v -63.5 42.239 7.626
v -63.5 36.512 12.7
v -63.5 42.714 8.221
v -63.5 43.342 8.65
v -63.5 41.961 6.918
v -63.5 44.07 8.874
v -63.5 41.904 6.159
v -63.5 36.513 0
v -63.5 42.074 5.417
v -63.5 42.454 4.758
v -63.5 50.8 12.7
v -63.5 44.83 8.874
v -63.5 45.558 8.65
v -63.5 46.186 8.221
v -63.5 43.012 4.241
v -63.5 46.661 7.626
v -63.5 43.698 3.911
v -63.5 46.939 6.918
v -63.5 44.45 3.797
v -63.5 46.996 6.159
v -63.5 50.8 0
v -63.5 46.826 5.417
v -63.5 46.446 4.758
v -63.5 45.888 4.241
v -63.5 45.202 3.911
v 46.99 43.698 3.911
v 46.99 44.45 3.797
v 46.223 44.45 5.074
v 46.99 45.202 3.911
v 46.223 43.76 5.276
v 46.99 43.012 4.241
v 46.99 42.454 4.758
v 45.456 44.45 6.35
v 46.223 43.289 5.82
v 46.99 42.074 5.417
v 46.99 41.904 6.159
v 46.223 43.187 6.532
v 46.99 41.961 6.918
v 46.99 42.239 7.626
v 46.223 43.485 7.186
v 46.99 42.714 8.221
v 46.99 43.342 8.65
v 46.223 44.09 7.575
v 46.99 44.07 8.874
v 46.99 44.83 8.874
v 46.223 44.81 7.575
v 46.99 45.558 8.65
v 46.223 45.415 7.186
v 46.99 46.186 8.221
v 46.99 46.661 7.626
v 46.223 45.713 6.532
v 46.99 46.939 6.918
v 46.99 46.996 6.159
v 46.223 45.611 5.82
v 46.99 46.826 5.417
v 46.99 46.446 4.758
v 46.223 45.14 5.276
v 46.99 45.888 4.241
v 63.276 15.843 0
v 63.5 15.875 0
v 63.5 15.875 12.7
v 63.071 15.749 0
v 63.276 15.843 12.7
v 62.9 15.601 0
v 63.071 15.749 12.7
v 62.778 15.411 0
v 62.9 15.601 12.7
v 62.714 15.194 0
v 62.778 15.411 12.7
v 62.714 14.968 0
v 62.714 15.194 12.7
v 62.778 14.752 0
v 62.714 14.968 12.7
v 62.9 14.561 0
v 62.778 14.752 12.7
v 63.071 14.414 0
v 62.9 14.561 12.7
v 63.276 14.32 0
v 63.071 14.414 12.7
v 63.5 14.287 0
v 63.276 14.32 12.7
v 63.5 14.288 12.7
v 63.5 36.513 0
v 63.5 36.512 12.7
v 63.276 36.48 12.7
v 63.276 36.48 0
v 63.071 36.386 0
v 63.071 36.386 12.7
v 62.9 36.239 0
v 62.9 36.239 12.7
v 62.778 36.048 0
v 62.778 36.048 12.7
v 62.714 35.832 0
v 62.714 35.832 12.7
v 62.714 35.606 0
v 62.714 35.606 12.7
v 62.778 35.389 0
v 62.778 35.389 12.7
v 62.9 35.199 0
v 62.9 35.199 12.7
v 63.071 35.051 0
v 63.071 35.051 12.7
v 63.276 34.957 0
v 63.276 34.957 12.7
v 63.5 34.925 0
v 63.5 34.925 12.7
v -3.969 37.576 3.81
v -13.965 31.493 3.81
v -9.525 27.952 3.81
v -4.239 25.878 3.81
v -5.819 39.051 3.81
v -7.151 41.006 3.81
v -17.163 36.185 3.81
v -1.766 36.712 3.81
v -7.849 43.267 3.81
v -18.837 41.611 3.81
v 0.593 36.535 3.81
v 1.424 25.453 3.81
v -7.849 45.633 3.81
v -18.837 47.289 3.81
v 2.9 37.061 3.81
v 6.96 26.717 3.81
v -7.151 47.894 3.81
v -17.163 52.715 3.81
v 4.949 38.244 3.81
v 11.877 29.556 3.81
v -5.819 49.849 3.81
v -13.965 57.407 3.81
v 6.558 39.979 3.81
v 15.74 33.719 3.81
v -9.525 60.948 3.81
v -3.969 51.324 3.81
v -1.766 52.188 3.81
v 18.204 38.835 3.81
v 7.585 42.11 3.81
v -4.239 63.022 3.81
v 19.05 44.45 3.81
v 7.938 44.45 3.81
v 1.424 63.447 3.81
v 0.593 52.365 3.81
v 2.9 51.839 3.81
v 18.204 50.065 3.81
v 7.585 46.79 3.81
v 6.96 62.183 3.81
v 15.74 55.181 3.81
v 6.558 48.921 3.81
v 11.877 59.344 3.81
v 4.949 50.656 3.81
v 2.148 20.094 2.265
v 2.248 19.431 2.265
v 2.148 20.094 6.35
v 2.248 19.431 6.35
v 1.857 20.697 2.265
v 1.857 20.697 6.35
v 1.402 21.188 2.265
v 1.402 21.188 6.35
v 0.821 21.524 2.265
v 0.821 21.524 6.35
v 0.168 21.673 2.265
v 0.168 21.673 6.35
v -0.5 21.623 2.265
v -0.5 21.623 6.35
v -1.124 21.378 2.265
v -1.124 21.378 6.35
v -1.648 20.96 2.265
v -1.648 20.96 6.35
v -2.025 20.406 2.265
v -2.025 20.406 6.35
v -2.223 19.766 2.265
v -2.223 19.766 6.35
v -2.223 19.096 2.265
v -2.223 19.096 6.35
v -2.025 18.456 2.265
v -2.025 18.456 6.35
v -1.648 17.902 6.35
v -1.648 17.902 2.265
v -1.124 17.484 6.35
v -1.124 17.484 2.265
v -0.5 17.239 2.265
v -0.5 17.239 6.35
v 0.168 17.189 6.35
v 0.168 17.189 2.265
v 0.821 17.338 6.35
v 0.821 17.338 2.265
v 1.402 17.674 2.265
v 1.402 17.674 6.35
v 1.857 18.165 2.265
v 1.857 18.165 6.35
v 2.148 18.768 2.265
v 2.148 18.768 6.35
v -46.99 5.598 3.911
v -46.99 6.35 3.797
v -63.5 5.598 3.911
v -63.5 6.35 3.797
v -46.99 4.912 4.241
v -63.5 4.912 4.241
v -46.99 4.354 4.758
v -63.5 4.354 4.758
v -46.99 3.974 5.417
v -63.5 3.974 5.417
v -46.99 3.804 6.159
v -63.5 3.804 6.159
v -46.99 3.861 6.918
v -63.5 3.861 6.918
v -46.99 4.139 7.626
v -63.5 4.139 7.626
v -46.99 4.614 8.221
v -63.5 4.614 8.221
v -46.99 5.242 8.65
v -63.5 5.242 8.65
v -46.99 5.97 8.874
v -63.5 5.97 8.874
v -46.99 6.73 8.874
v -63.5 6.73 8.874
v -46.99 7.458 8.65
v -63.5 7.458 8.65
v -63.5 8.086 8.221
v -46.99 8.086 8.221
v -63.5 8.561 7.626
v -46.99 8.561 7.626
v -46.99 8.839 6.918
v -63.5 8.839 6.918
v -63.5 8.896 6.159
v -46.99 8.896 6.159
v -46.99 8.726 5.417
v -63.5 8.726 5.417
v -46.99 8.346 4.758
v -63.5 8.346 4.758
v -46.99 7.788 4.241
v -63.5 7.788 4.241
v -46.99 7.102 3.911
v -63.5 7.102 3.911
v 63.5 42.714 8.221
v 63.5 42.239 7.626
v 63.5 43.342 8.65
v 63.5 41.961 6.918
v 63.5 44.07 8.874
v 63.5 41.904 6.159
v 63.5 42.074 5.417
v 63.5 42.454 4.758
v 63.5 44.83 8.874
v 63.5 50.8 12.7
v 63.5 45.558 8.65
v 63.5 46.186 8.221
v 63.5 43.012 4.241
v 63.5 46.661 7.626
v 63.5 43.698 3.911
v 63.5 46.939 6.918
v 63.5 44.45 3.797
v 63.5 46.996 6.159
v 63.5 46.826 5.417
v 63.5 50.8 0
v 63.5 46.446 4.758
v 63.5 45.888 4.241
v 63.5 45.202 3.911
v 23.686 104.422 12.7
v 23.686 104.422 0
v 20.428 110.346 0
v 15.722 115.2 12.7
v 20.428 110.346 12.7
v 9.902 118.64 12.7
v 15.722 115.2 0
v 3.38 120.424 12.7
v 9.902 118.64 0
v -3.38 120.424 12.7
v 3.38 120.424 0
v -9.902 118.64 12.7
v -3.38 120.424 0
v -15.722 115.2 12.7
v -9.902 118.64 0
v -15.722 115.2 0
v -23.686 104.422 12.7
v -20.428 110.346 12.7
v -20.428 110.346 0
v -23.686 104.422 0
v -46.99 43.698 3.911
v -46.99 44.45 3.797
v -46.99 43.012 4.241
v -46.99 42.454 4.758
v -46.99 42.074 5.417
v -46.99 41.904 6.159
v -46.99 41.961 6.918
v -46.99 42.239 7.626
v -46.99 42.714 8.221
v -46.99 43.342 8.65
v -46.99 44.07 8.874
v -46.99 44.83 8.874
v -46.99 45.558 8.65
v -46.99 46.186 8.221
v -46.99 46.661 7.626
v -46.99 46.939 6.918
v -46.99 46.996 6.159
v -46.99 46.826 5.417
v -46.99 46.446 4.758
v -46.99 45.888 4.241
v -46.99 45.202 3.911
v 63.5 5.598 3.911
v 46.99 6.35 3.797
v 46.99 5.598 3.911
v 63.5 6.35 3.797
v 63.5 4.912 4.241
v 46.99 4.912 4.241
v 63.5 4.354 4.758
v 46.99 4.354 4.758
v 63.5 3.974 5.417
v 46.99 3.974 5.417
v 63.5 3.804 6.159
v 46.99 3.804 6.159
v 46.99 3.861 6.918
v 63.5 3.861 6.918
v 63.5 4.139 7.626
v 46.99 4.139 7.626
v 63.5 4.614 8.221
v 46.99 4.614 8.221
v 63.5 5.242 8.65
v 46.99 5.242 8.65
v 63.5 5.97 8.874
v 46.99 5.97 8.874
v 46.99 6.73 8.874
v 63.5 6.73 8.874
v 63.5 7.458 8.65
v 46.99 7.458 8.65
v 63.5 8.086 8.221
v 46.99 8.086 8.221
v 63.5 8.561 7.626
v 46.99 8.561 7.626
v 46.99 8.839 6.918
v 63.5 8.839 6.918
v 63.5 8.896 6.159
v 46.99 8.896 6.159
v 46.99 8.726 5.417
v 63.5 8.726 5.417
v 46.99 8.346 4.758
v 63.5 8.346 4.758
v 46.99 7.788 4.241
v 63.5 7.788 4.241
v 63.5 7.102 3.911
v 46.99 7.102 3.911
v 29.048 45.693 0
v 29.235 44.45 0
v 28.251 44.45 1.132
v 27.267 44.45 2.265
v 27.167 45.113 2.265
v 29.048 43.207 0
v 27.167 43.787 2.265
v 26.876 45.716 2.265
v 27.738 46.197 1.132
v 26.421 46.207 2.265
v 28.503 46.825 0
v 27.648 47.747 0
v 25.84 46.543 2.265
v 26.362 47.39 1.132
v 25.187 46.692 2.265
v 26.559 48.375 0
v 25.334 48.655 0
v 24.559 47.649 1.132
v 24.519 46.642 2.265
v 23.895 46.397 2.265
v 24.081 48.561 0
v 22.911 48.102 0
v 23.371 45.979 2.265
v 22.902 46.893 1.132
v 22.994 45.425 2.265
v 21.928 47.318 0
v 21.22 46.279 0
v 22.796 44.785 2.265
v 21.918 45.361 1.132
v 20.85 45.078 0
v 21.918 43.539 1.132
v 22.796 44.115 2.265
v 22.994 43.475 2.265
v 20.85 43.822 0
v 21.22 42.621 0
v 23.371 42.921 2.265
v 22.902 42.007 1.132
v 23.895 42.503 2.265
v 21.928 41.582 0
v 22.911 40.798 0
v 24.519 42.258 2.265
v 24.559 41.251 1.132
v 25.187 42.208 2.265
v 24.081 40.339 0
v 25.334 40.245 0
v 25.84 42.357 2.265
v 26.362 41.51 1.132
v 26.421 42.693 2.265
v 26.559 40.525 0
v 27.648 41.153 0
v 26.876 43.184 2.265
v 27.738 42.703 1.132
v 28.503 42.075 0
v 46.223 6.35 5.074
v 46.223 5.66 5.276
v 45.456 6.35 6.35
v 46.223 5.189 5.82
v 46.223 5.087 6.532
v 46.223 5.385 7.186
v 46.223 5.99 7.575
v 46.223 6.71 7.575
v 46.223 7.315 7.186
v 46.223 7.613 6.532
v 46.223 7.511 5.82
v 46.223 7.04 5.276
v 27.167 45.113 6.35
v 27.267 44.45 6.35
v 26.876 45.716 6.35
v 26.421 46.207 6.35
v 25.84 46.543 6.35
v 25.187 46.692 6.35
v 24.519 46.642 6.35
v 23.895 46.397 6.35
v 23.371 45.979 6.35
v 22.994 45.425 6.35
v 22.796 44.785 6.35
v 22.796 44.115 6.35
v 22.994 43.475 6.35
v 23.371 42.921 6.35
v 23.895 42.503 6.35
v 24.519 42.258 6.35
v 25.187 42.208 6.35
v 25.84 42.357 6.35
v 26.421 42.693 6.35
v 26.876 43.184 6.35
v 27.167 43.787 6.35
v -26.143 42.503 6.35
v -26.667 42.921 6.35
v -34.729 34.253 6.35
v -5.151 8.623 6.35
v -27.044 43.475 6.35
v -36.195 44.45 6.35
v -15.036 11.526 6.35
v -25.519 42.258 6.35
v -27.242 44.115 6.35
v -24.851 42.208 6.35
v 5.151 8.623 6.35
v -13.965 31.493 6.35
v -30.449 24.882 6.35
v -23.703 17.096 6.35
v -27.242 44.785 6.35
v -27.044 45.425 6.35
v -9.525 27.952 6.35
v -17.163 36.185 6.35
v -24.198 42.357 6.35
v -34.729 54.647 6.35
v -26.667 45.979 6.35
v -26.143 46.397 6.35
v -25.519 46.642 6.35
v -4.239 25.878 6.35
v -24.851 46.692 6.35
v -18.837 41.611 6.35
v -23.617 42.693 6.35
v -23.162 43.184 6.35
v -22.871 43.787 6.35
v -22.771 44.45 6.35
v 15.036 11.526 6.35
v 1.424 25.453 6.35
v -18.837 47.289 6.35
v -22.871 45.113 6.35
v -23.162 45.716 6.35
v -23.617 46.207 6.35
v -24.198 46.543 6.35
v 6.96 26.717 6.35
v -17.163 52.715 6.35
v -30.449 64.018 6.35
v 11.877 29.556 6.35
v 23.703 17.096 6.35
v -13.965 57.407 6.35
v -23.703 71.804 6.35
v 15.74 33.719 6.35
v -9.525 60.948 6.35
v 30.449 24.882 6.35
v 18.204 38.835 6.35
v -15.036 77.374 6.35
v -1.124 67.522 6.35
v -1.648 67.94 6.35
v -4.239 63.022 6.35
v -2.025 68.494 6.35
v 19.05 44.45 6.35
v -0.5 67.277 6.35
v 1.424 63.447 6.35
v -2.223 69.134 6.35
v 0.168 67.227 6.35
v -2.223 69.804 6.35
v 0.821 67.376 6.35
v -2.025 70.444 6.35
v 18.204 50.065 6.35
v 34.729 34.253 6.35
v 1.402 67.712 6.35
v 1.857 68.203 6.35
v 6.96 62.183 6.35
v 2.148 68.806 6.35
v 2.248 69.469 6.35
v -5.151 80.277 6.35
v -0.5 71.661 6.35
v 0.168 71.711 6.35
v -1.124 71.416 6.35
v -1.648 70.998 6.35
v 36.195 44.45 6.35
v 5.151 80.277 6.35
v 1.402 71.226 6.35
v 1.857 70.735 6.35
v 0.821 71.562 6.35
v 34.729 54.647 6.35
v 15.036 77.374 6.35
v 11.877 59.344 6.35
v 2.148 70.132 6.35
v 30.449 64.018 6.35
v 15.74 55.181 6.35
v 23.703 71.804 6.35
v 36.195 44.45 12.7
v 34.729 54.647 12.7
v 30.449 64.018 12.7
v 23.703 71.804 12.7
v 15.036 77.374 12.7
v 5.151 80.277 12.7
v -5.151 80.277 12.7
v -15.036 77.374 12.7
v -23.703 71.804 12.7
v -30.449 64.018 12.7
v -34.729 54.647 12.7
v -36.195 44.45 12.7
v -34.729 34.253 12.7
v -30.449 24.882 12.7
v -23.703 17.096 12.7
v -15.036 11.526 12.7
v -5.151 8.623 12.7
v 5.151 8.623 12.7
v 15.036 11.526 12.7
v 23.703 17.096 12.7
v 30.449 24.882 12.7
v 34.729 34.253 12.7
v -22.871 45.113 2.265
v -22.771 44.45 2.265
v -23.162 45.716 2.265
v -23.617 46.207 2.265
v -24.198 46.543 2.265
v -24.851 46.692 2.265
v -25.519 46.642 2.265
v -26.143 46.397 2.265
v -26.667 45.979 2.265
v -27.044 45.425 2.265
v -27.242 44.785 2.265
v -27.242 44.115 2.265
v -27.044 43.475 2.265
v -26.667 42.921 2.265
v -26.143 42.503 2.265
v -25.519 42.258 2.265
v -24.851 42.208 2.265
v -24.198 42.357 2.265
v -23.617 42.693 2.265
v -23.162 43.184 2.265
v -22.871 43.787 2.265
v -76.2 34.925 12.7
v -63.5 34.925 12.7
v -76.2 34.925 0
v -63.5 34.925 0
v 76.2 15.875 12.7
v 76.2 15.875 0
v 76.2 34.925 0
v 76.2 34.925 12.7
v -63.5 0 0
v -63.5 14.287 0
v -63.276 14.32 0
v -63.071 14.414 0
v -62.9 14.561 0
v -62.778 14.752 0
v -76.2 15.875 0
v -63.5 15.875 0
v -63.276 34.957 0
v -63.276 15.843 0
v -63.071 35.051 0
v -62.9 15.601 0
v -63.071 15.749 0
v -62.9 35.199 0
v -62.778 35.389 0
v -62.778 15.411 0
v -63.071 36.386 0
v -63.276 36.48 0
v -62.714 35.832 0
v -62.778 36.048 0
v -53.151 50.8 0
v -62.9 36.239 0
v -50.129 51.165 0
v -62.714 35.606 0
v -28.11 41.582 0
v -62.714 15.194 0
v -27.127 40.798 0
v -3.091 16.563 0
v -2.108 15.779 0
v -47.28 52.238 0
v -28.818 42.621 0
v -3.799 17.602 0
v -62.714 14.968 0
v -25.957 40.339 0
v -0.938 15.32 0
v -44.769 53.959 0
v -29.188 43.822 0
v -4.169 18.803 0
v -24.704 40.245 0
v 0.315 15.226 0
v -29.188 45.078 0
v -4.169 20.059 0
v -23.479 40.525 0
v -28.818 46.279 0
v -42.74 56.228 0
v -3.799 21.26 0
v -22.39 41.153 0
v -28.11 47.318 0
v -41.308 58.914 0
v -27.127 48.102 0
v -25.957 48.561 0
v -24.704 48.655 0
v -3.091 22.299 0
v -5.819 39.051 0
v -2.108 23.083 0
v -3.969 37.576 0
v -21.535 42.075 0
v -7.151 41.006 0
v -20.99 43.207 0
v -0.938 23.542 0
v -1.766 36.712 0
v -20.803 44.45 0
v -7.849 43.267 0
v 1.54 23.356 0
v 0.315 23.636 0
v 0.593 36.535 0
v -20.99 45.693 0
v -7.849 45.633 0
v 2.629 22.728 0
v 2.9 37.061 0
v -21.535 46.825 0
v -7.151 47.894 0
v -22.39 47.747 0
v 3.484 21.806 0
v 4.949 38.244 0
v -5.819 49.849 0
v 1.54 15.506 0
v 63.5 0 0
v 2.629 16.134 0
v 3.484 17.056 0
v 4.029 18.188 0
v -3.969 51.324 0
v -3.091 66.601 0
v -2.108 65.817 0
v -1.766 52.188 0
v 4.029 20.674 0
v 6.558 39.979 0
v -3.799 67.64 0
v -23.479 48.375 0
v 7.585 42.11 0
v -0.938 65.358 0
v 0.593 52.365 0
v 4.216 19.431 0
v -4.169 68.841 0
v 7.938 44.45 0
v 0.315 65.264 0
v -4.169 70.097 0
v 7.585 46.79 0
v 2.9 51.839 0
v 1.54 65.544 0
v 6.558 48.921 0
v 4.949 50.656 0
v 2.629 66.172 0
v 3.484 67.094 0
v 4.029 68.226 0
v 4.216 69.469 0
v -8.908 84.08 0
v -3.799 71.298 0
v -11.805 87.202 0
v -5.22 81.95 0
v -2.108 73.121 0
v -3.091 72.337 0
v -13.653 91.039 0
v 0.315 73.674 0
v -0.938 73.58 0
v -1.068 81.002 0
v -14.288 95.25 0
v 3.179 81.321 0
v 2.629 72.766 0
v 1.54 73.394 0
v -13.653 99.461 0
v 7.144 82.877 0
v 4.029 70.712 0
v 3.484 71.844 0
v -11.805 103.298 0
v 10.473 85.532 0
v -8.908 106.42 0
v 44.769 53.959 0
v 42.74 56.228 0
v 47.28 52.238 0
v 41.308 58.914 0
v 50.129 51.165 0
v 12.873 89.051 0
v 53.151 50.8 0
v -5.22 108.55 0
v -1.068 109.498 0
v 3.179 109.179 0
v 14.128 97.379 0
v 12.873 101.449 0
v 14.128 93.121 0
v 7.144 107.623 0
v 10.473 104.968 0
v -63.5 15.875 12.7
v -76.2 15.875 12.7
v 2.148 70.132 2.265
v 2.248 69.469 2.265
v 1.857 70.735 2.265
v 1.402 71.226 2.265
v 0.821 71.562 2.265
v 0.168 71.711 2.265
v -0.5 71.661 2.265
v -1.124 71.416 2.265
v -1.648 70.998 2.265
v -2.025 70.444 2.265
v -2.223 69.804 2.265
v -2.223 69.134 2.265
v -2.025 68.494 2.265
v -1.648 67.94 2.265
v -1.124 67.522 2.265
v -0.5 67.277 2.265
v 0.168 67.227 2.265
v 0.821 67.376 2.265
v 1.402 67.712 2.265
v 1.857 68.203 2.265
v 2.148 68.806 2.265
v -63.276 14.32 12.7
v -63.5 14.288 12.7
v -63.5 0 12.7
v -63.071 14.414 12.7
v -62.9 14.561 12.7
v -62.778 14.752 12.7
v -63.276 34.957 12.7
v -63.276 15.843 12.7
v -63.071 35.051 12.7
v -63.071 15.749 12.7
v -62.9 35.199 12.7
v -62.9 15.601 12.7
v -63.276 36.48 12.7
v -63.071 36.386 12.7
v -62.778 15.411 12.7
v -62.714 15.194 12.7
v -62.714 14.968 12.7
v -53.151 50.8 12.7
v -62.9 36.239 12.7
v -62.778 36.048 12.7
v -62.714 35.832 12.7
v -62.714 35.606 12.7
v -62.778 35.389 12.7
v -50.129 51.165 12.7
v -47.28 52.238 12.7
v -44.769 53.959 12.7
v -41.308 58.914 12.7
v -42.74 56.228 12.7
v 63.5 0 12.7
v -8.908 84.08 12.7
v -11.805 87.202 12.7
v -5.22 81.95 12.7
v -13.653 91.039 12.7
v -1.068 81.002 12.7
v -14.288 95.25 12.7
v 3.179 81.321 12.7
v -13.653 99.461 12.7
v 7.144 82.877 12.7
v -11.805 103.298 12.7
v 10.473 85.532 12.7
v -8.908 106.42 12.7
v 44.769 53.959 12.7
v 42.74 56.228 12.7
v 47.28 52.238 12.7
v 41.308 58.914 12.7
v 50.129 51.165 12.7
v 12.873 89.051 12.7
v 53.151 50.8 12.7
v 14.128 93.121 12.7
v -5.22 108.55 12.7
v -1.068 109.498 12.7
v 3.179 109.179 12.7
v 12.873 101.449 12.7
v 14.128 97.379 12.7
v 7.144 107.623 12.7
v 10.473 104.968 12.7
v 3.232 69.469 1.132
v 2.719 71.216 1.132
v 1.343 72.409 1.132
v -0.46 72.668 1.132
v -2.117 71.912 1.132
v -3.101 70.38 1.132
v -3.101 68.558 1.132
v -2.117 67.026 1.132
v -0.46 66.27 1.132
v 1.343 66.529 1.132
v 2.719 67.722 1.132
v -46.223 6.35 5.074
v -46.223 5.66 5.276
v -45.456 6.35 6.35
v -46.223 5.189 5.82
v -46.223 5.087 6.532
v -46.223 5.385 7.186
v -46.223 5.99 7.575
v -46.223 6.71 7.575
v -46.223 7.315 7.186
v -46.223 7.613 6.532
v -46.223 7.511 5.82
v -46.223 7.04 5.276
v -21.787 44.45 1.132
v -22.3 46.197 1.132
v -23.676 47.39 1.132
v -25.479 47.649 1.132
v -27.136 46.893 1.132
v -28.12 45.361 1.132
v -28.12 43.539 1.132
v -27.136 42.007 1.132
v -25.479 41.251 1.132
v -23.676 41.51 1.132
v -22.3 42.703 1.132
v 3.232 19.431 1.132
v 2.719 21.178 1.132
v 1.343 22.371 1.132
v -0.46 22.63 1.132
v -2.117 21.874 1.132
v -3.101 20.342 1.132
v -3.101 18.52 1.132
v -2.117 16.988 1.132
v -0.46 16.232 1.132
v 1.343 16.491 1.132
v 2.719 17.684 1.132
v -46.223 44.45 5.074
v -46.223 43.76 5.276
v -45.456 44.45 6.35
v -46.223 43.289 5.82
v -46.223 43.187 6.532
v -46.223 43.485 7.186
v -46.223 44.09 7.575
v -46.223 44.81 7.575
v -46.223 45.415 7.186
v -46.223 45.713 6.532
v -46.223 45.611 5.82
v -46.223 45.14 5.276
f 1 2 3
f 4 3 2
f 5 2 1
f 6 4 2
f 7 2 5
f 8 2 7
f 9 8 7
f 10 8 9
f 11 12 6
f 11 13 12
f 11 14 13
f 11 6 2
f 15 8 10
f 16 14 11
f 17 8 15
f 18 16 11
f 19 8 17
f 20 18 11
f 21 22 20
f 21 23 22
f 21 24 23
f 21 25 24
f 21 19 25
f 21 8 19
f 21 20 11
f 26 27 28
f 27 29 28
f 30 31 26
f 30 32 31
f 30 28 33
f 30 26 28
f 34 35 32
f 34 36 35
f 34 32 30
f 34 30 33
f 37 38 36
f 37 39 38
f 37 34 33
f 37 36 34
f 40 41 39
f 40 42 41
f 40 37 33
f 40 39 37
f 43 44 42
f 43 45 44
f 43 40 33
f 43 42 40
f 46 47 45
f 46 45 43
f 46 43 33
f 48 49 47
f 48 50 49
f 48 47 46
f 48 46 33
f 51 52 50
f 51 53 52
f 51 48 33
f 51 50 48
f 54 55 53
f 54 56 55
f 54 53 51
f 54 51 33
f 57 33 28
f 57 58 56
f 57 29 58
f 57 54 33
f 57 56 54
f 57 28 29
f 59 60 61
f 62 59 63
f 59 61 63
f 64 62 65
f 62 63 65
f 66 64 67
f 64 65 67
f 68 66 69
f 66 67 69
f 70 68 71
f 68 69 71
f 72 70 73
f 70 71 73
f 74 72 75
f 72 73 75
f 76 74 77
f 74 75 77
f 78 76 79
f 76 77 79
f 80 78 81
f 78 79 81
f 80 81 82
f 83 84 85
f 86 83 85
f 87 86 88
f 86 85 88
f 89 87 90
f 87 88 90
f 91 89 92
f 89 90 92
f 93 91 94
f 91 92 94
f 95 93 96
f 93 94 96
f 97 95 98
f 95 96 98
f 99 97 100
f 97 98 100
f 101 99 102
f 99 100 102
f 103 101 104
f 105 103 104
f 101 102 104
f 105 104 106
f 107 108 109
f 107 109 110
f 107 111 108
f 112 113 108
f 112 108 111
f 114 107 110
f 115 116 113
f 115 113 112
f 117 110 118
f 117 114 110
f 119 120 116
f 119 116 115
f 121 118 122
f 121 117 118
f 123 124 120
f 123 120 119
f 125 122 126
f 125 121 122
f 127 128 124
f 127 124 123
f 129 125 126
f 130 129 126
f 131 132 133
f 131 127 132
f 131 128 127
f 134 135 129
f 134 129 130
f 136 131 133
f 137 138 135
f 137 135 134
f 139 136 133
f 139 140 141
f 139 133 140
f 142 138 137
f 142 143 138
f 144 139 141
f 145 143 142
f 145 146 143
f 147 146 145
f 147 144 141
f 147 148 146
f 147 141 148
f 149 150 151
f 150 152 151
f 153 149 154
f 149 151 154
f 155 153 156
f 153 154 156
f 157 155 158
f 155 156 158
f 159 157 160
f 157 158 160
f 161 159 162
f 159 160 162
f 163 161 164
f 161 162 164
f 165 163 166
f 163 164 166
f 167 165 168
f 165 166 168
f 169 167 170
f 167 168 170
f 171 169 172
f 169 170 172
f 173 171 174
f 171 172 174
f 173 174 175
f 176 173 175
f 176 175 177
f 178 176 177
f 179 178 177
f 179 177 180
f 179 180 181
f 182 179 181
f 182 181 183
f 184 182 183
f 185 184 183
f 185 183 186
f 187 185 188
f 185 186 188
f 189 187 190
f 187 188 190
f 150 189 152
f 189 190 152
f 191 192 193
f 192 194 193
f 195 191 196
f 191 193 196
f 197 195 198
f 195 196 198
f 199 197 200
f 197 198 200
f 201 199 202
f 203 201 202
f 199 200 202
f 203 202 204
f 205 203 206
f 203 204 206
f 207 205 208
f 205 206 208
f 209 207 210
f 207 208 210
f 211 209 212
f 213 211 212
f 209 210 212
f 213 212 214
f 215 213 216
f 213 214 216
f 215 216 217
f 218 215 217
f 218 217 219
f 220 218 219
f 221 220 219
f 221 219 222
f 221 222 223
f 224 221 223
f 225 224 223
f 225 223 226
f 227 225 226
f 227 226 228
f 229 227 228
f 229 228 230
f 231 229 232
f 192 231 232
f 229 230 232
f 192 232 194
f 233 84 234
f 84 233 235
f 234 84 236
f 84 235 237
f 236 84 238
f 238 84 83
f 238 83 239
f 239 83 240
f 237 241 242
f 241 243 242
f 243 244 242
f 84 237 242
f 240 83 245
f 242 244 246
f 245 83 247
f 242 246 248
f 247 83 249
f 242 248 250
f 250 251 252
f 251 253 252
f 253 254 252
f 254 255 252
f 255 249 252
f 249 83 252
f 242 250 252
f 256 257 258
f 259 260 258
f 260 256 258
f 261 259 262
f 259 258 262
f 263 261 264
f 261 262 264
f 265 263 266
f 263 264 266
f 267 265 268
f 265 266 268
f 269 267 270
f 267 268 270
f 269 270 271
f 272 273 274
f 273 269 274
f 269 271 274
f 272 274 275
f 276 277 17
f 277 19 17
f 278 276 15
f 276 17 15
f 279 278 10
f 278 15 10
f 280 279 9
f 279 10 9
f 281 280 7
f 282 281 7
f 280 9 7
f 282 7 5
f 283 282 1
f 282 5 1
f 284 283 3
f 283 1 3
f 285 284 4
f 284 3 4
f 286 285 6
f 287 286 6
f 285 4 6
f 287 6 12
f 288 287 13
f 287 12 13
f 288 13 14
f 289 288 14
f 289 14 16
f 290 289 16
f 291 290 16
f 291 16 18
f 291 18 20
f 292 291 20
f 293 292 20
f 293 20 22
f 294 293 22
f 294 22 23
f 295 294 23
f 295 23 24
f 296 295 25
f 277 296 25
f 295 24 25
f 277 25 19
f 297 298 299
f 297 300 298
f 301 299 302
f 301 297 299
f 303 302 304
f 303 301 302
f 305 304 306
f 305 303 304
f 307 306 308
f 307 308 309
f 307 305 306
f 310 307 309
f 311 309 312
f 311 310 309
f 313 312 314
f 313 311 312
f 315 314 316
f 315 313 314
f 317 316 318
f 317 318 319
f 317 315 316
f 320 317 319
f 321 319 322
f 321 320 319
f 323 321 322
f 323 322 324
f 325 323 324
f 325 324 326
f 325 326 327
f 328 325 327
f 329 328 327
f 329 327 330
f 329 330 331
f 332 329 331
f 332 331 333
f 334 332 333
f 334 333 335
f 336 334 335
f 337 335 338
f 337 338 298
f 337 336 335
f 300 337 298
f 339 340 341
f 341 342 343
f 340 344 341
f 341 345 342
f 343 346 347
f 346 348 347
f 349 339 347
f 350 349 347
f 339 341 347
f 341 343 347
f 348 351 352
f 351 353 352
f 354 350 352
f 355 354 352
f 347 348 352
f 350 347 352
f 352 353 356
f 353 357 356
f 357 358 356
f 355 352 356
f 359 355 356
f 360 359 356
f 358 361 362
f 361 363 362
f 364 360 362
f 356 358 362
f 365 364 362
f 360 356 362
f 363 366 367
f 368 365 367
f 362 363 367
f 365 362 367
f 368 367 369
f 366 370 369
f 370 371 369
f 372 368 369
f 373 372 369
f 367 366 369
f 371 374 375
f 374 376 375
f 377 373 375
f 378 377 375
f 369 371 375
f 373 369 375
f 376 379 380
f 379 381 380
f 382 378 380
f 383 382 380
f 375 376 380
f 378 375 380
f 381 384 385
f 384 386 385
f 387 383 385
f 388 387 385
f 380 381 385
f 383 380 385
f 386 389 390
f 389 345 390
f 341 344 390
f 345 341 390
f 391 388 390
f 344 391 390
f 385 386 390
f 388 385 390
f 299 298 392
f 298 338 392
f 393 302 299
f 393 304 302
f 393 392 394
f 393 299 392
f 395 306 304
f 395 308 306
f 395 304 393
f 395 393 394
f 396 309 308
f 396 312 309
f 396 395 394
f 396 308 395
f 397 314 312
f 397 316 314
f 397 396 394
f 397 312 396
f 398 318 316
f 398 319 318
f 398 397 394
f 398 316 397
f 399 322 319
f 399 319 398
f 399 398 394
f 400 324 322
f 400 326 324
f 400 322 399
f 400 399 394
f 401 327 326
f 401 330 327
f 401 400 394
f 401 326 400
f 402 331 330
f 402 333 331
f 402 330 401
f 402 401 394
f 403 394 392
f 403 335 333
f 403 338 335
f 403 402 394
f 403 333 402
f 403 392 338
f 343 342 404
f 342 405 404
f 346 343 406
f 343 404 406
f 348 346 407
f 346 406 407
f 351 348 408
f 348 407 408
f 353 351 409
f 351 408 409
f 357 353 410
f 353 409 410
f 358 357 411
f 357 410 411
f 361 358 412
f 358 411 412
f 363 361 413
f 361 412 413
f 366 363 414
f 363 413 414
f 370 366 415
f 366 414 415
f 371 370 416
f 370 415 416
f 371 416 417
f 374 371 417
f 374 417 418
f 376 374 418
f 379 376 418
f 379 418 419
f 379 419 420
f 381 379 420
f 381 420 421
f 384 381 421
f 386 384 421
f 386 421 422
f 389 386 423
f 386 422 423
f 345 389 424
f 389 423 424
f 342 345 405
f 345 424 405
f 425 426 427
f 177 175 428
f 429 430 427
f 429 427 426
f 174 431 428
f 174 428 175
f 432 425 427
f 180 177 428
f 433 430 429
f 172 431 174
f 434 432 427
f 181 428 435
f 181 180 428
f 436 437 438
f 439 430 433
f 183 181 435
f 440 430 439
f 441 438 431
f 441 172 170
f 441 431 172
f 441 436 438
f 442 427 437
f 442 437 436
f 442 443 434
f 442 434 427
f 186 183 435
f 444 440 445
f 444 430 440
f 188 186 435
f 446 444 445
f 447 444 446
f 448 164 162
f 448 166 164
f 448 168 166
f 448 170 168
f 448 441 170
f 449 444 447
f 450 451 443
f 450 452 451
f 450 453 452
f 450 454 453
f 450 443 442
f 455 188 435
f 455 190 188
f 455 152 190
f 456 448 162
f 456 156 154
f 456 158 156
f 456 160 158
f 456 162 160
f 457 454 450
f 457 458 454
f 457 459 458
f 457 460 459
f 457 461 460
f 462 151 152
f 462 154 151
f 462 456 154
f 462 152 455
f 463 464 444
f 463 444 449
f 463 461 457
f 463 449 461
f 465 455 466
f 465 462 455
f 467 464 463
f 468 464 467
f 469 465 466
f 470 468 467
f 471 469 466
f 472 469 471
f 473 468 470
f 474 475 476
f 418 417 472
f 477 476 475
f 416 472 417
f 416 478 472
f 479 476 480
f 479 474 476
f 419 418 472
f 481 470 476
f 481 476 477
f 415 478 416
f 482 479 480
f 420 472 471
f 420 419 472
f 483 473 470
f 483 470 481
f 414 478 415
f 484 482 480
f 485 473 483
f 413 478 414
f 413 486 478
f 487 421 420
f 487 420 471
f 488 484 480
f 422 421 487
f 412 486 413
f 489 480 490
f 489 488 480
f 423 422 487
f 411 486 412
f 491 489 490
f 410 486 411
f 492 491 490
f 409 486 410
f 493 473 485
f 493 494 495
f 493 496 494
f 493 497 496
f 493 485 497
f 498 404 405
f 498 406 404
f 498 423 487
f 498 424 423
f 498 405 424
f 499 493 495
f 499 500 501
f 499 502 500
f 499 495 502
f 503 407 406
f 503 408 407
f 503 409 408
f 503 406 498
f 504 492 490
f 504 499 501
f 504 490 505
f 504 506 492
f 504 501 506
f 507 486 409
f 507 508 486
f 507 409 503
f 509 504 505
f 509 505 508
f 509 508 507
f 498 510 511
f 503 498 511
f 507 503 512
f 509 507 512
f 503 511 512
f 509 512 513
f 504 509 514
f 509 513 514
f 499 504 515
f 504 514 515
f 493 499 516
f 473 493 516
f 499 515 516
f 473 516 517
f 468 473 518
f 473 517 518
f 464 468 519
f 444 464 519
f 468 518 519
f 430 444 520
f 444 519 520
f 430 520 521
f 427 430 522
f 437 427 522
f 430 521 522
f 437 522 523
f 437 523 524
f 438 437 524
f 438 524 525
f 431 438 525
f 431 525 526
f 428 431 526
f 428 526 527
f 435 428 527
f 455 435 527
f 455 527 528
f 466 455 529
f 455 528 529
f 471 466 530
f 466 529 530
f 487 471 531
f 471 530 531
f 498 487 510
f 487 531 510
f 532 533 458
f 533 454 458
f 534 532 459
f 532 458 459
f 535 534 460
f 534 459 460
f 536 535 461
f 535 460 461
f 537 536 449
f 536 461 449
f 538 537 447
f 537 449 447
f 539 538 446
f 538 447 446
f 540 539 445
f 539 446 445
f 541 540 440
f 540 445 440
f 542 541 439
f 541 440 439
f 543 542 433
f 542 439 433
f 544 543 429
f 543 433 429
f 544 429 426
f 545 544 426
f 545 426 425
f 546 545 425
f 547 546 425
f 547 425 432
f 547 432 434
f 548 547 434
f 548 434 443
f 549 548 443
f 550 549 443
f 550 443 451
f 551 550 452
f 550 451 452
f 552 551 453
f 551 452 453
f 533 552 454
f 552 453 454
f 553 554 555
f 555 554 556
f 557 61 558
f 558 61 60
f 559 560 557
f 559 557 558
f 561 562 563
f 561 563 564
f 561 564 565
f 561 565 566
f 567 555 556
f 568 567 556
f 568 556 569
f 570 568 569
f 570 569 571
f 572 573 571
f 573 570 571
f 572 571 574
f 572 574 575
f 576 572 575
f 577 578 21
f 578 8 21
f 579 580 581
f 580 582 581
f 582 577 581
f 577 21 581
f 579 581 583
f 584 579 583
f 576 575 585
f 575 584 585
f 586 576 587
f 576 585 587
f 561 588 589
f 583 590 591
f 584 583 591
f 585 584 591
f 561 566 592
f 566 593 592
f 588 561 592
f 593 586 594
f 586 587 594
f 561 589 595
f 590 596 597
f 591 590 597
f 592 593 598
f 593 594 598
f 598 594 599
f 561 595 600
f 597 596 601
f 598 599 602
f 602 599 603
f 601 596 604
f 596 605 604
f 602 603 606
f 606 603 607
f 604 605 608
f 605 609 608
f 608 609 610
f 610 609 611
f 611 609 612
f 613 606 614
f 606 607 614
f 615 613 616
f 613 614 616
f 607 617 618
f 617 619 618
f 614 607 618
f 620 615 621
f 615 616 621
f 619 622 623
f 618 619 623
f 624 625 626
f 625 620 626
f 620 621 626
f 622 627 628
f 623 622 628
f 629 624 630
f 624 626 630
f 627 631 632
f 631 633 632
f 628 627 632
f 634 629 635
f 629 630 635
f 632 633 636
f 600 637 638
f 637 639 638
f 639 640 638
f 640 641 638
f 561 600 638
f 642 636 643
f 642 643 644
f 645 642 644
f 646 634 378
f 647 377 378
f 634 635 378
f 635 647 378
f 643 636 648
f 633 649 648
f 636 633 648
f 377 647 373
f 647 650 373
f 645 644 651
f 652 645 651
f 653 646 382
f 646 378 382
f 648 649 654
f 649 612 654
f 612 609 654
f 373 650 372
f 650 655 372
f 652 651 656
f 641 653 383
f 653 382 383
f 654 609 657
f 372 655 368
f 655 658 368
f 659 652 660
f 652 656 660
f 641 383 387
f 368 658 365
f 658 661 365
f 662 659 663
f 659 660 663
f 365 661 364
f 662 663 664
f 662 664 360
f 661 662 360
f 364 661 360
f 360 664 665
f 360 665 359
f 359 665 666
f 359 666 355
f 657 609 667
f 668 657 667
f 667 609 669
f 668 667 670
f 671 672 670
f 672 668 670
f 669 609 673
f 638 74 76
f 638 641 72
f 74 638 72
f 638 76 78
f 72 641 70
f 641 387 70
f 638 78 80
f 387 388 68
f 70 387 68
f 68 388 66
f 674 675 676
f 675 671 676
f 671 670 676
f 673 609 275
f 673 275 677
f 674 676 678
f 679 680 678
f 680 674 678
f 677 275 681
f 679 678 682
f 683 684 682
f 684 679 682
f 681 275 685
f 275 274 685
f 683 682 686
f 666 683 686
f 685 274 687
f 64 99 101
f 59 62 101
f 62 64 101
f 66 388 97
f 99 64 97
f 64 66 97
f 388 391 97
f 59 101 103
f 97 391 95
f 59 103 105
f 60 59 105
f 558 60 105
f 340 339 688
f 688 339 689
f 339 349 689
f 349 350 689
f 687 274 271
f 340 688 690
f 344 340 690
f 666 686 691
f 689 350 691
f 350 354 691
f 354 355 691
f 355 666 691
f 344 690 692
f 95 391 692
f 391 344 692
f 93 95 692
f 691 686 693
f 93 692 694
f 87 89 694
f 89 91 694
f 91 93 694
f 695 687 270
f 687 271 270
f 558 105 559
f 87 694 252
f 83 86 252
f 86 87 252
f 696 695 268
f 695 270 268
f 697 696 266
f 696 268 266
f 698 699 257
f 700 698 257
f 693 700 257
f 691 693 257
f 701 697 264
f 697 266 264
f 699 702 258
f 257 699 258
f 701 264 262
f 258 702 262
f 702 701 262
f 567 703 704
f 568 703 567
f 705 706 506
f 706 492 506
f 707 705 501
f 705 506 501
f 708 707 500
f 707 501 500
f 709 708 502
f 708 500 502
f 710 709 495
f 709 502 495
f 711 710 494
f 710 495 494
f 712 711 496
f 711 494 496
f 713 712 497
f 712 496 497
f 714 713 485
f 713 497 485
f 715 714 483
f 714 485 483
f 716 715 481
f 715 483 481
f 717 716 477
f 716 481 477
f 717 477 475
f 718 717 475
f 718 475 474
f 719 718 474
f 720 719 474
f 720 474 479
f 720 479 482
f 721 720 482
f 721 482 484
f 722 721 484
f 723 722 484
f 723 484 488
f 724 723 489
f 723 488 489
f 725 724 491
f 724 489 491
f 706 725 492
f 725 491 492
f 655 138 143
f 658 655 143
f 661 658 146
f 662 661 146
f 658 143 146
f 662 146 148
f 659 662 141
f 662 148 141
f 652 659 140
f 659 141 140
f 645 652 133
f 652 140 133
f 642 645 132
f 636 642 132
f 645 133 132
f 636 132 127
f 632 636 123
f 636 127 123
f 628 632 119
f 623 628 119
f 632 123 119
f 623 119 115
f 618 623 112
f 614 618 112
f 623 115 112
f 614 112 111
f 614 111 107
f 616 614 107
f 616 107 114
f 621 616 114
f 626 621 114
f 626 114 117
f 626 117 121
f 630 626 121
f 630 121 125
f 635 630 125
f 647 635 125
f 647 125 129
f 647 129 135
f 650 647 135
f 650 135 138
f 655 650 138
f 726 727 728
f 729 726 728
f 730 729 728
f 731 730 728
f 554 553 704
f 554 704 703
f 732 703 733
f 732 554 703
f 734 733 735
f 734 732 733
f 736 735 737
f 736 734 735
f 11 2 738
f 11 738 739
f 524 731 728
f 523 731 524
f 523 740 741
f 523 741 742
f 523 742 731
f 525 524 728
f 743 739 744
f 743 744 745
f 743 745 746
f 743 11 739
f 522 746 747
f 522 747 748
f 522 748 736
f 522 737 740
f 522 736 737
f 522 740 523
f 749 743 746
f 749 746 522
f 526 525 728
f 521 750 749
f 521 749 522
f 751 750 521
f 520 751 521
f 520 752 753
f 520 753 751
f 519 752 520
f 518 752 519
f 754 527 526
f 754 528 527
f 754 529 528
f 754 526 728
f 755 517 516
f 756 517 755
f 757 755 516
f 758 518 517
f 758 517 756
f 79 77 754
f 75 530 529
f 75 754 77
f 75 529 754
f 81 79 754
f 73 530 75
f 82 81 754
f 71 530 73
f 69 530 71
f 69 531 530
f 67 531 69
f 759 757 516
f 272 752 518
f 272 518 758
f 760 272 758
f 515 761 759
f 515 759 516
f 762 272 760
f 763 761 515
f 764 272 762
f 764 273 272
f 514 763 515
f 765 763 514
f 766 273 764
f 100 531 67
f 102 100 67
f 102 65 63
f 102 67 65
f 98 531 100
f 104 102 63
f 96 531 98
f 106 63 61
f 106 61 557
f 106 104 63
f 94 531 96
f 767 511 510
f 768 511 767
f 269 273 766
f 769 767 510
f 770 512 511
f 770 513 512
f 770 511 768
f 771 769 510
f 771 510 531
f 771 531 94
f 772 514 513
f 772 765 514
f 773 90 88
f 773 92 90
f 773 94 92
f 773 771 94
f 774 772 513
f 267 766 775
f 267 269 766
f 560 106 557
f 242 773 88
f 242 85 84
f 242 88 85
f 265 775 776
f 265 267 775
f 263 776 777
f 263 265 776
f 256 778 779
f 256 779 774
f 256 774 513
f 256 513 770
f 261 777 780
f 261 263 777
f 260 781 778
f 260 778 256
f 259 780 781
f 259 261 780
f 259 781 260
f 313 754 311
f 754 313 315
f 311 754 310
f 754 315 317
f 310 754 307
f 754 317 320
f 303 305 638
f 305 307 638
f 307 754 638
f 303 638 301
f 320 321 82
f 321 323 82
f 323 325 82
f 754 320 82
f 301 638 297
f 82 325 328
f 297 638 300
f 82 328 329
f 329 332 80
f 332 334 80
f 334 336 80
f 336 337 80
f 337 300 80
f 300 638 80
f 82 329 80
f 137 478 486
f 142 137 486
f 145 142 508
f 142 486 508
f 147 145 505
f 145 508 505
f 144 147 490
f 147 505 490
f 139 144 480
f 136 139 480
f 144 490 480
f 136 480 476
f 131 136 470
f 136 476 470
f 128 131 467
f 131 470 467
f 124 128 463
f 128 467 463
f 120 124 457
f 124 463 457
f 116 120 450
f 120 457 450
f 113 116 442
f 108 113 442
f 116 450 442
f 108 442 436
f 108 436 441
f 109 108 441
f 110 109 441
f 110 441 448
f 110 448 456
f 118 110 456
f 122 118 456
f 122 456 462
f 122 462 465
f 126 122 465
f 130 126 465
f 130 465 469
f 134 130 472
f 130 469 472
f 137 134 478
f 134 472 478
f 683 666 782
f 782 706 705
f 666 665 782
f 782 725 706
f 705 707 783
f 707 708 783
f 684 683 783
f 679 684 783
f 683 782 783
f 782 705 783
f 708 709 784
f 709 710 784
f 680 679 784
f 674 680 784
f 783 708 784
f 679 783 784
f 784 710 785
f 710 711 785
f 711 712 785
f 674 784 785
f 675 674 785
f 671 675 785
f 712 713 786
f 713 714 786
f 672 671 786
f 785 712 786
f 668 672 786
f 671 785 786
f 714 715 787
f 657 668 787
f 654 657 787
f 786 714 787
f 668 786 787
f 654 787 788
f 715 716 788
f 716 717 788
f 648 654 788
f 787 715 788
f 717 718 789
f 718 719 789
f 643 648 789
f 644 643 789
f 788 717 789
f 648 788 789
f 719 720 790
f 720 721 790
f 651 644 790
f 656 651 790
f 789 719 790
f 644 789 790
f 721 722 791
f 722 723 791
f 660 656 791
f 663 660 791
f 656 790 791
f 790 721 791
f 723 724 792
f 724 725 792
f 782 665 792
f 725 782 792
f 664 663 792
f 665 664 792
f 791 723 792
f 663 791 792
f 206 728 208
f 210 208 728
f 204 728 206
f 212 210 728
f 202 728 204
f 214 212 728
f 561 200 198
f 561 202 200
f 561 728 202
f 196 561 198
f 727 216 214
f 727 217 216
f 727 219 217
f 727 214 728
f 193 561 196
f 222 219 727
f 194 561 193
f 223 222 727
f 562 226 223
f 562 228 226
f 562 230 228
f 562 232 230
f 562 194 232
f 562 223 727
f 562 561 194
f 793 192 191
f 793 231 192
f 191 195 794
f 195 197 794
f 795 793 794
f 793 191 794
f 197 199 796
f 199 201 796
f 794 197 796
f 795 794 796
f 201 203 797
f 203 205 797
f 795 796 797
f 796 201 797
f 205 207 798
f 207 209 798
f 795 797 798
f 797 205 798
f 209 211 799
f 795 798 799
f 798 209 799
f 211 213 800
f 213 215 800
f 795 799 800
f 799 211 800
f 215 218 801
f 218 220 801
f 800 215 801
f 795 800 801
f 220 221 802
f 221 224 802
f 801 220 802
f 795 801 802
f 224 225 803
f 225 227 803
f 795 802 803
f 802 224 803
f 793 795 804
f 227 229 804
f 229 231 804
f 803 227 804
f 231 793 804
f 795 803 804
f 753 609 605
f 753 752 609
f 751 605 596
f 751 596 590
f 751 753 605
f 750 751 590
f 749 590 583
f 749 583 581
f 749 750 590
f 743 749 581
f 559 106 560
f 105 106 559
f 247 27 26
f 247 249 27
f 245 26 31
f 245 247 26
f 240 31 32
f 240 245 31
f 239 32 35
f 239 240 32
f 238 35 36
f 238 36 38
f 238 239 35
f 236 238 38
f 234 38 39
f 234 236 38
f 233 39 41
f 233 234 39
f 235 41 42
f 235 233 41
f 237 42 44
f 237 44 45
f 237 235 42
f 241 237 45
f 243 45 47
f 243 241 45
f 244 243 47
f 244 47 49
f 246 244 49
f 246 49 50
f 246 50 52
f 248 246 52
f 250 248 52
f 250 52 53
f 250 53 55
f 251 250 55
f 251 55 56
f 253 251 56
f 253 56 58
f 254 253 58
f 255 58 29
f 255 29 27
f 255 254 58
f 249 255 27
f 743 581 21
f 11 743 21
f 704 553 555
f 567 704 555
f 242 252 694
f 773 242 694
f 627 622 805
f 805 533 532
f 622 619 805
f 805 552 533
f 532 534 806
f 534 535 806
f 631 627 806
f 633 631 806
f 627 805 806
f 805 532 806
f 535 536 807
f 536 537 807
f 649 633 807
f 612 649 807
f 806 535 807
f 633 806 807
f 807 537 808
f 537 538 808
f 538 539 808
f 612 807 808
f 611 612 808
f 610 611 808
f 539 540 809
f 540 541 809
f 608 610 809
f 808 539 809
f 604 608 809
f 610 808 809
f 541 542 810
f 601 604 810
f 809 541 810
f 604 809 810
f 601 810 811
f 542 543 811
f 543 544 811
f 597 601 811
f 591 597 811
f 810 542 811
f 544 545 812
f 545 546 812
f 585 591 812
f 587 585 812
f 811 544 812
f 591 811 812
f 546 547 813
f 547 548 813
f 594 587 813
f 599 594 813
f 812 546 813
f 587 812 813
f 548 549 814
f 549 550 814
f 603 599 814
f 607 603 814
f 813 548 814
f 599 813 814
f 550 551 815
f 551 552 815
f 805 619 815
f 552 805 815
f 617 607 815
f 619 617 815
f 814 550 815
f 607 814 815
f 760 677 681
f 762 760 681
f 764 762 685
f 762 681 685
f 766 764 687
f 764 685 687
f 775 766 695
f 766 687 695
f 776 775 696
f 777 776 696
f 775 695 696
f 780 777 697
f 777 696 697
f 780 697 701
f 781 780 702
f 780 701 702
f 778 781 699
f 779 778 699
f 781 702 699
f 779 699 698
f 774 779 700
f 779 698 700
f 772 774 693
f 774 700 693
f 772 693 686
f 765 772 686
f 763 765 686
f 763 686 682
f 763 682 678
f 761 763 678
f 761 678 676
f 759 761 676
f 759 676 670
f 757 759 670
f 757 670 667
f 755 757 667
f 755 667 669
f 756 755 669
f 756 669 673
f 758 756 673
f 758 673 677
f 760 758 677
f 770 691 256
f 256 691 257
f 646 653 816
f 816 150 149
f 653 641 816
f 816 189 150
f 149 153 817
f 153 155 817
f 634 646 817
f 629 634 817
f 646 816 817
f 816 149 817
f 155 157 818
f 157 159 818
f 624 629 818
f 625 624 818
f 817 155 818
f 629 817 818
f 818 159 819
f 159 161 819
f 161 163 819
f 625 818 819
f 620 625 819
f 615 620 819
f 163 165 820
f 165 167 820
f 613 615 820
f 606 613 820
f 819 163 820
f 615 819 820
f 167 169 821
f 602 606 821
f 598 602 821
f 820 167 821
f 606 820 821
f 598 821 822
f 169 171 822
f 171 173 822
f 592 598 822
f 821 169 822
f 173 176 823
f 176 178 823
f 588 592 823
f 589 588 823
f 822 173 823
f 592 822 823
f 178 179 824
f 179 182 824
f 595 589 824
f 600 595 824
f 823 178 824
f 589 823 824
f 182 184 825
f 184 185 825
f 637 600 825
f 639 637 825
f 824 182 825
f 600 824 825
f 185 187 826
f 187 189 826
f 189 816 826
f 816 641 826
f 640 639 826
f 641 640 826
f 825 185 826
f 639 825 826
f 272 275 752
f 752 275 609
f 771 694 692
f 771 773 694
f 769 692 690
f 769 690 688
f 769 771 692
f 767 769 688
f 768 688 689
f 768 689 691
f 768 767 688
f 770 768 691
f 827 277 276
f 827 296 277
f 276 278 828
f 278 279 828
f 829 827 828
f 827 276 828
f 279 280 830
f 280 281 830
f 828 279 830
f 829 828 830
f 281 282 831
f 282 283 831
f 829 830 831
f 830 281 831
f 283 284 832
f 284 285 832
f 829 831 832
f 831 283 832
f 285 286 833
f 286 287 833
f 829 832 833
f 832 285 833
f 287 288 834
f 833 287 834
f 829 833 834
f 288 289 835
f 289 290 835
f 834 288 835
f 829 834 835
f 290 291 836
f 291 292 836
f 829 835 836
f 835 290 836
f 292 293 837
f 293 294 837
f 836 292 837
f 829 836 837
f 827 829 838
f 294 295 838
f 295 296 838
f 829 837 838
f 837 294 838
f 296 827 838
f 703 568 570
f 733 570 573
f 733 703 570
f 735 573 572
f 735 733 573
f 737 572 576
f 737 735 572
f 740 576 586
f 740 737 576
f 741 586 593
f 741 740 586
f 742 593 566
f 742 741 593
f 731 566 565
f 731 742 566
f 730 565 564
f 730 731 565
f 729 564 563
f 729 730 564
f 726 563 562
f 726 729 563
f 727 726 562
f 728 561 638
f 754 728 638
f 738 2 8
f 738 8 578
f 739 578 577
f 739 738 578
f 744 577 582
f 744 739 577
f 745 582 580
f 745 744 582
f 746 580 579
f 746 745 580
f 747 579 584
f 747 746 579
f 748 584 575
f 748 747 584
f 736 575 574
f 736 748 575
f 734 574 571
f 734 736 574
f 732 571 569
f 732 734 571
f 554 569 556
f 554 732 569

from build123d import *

# Parameters (mm, degrees)
SKETCH1_W                                      = 127
SKETCH1_H                                      = 152.4
BOSS_EXTRUDE1_DEPTH                            = 12.7
SKETCH2_R                                      = 14.2875
CUT_EXTRUDE1_DEPTH                             = 13.7
SKETCH3_R                                      = 7.9375
SKETCH3_R_2                                    = 1.016
CUT_EXTRUDE2_DEPTH                             = 13.7
SKETCH4_R                                      = 36.195
CUT_EXTRUDE3_DEPTH                             = 6.35
SKETCH5_R                                      = 19.05
CUT_EXTRUDE4_DEPTH                             = 2.54
CSK_FOR_8_FLAT_HEAD_MACHINE_SCREW1_D           = 4.4958
CSK_FOR_8_FLAT_HEAD_MACHINE_SCREW1_CSINK_D     = 8.4328
CSK_FOR_8_FLAT_HEAD_MACHINE_SCREW1_CSINK_ANGLE = 82
FILLET1_R                                      = 12.7
F_1_4_20_TAPPED_HOLE1_AT_2_COUNT               = 2
F_1_4_20_TAPPED_HOLE1_AT_2_PITCH               = 38.1
SKETCH10_W                                     = 12.7
SKETCH10_H                                     = 19.05
BOSS_EXTRUDE2_DEPTH                            = 12.7
SKETCH11_R                                     = 0.79375
CUT_EXTRUDE5_DEPTH                             = 13.7


with BuildPart() as part:
    # Sketch1 → Boss-Extrude1 (new body)
    with BuildSketch(Plane.XY):
        with Locations((0, 76.2)):
            Rectangle(SKETCH1_W, SKETCH1_H)
    extrude(amount=BOSS_EXTRUDE1_DEPTH)

    # Sketch2 → Cut-Extrude1 (cut, through all)
    with BuildSketch(Plane(origin=(0, 0, 0), x_dir=(-1, 0, 0), z_dir=(0, 0, -1))):
        with BuildLine():
            Line((44.45, 50.8), (63.5, 50.8))
            Line((63.5, 50.8), (63.5, 152.4))
            Line((63.5, 152.4), (-63.5, 152.4))
            Line((-63.5, 152.4), (-63.5, 50.8))
            Line((-63.5, 50.8), (-44.45, 50.8))
            Line((-44.45, 50.8), (-23.686198751, 104.421913036))
            ThreePointArc((-23.686198751, 104.421913036), (0, 120.65), (23.686198751, 104.421913036))
            Line((23.686198751, 104.421913036), (44.45, 50.8))
        make_face()
        with Locations((0, 95.25)):
            Circle(SKETCH2_R)
    extrude(amount=-CUT_EXTRUDE1_DEPTH, mode=Mode.SUBTRACT)

    # Sketch3 → Cut-Extrude2 (cut, through all)
    with BuildSketch(Plane.XY.offset(12.7)):
        with Locations((0, 44.45)):
            Circle(SKETCH3_R)
        with Locations((-25.019, 44.45)):
            Circle(SKETCH3_R_2)
        with Locations((25.019, 44.45)):
            Circle(SKETCH3_R_2)
        with Locations((0, 69.469)):
            Circle(SKETCH3_R_2)
        with Locations((0, 19.431)):
            Circle(SKETCH3_R_2)
    extrude(amount=-CUT_EXTRUDE2_DEPTH, mode=Mode.SUBTRACT)

    # Sketch4 → Cut-Extrude3 (cut)
    with BuildSketch(Plane.XY.offset(12.7)):
        with Locations((0, 44.45)):
            Circle(SKETCH4_R)
    extrude(amount=-CUT_EXTRUDE3_DEPTH, mode=Mode.SUBTRACT)

    # Sketch5 → Cut-Extrude4 (cut)
    with BuildSketch(Plane.XY.offset(6.35)):
        with Locations((0, 44.45)):
            Circle(SKETCH5_R)
    extrude(amount=-CUT_EXTRUDE4_DEPTH, mode=Mode.SUBTRACT)

    # CSK for #8 Flat Head Machine Screw1 (through all)
    with Locations(Plane(origin=(0, 0, 0), x_dir=(-1, 0, 0), z_dir=(0, 0, -1))):
        with Locations((0, 69.469), (25.019, 44.45), (0, 19.431), (-25.019, 44.45)):
            CounterSinkHole(CSK_FOR_8_FLAT_HEAD_MACHINE_SCREW1_D / 2, CSK_FOR_8_FLAT_HEAD_MACHINE_SCREW1_CSINK_D / 2, counter_sink_angle=CSK_FOR_8_FLAT_HEAD_MACHINE_SCREW1_CSINK_ANGLE)

    # Fillet1
    fillet1_edges = [part.edges().sort_by_distance(p)[0] for p in [
        (44.45, 50.8, 6.35),
        (-44.45, 50.8, 6.35),
    ]]
    fillet(fillet1_edges, radius=FILLET1_R)

    # Sketch8 → 1/4-20 Tapped Hole1 (revolve, cut)
    with BuildSketch(Plane(origin=(63.5, 44.45, 6.35), x_dir=(0, 0, -1), z_dir=(0, 1, 0))):
        Polygon((0, 0), (0, 18.043816902), (2.5527, 16.51), (2.5527, 0), align=None)
    f_1_4_20_tapped_hole1 = revolve(axis=Axis((69.85, 44.45, 6.35), (-1, 0, 0)), mode=Mode.SUBTRACT)

    # 1/4-20 Tapped Hole1 at 2: 1/4-20 Tapped Hole1 ×2
    with Locations(*[(0, -i * F_1_4_20_TAPPED_HOLE1_AT_2_PITCH, 0) for i in range(1, F_1_4_20_TAPPED_HOLE1_AT_2_COUNT)]):
        add(f_1_4_20_tapped_hole1, mode=Mode.SUBTRACT)

    # Sketch10 → Boss-Extrude2 (add)
    with BuildSketch(Plane(origin=(63.5, 0, 0), x_dir=(0, 0, -1), z_dir=(1, 0, 0))):
        with Locations((-6.35, 25.4)):
            Rectangle(SKETCH10_W, SKETCH10_H)
    boss_extrude2 = extrude(amount=BOSS_EXTRUDE2_DEPTH)

    # Sketch11 → Cut-Extrude5 (cut, through all)
    with BuildSketch(Plane.XY.offset(12.7)):
        with Locations((63.5, 35.71875)):
            Circle(SKETCH11_R)
        with Locations((63.5, 15.08125)):
            Circle(SKETCH11_R)
    cut_extrude5 = extrude(amount=-CUT_EXTRUDE5_DEPTH, mode=Mode.SUBTRACT)

    # Mirror1: 1/4-20 Tapped Hole1, Boss-Extrude2, Cut-Extrude5 across plane
    add(f_1_4_20_tapped_hole1.mirror(Plane(origin=(0, 0, 0), x_dir=(0, 0, 1), z_dir=(1, 0, 0))), mode=Mode.SUBTRACT)
    add(boss_extrude2.mirror(Plane(origin=(0, 0, 0), x_dir=(0, 0, 1), z_dir=(1, 0, 0))))
    add(cut_extrude5.mirror(Plane(origin=(0, 0, 0), x_dir=(0, 0, 1), z_dir=(1, 0, 0))), mode=Mode.SUBTRACT)

    # Mirror1 copy 1 sketch → Mirror1 copy 1 (revolve, cut)
    with BuildSketch(Plane(origin=(-63.5, 6.35, 6.35), x_dir=(0, 0, -1), z_dir=(0, 1, 0))):
        Polygon((0, 0), (0, -18.043816902), (2.5527, -16.51), (2.5527, 0), align=None)
    revolve(axis=Axis((-69.85, 6.35, 6.35), (-1, 0, 0)), mode=Mode.SUBTRACT)


solid = part.part
